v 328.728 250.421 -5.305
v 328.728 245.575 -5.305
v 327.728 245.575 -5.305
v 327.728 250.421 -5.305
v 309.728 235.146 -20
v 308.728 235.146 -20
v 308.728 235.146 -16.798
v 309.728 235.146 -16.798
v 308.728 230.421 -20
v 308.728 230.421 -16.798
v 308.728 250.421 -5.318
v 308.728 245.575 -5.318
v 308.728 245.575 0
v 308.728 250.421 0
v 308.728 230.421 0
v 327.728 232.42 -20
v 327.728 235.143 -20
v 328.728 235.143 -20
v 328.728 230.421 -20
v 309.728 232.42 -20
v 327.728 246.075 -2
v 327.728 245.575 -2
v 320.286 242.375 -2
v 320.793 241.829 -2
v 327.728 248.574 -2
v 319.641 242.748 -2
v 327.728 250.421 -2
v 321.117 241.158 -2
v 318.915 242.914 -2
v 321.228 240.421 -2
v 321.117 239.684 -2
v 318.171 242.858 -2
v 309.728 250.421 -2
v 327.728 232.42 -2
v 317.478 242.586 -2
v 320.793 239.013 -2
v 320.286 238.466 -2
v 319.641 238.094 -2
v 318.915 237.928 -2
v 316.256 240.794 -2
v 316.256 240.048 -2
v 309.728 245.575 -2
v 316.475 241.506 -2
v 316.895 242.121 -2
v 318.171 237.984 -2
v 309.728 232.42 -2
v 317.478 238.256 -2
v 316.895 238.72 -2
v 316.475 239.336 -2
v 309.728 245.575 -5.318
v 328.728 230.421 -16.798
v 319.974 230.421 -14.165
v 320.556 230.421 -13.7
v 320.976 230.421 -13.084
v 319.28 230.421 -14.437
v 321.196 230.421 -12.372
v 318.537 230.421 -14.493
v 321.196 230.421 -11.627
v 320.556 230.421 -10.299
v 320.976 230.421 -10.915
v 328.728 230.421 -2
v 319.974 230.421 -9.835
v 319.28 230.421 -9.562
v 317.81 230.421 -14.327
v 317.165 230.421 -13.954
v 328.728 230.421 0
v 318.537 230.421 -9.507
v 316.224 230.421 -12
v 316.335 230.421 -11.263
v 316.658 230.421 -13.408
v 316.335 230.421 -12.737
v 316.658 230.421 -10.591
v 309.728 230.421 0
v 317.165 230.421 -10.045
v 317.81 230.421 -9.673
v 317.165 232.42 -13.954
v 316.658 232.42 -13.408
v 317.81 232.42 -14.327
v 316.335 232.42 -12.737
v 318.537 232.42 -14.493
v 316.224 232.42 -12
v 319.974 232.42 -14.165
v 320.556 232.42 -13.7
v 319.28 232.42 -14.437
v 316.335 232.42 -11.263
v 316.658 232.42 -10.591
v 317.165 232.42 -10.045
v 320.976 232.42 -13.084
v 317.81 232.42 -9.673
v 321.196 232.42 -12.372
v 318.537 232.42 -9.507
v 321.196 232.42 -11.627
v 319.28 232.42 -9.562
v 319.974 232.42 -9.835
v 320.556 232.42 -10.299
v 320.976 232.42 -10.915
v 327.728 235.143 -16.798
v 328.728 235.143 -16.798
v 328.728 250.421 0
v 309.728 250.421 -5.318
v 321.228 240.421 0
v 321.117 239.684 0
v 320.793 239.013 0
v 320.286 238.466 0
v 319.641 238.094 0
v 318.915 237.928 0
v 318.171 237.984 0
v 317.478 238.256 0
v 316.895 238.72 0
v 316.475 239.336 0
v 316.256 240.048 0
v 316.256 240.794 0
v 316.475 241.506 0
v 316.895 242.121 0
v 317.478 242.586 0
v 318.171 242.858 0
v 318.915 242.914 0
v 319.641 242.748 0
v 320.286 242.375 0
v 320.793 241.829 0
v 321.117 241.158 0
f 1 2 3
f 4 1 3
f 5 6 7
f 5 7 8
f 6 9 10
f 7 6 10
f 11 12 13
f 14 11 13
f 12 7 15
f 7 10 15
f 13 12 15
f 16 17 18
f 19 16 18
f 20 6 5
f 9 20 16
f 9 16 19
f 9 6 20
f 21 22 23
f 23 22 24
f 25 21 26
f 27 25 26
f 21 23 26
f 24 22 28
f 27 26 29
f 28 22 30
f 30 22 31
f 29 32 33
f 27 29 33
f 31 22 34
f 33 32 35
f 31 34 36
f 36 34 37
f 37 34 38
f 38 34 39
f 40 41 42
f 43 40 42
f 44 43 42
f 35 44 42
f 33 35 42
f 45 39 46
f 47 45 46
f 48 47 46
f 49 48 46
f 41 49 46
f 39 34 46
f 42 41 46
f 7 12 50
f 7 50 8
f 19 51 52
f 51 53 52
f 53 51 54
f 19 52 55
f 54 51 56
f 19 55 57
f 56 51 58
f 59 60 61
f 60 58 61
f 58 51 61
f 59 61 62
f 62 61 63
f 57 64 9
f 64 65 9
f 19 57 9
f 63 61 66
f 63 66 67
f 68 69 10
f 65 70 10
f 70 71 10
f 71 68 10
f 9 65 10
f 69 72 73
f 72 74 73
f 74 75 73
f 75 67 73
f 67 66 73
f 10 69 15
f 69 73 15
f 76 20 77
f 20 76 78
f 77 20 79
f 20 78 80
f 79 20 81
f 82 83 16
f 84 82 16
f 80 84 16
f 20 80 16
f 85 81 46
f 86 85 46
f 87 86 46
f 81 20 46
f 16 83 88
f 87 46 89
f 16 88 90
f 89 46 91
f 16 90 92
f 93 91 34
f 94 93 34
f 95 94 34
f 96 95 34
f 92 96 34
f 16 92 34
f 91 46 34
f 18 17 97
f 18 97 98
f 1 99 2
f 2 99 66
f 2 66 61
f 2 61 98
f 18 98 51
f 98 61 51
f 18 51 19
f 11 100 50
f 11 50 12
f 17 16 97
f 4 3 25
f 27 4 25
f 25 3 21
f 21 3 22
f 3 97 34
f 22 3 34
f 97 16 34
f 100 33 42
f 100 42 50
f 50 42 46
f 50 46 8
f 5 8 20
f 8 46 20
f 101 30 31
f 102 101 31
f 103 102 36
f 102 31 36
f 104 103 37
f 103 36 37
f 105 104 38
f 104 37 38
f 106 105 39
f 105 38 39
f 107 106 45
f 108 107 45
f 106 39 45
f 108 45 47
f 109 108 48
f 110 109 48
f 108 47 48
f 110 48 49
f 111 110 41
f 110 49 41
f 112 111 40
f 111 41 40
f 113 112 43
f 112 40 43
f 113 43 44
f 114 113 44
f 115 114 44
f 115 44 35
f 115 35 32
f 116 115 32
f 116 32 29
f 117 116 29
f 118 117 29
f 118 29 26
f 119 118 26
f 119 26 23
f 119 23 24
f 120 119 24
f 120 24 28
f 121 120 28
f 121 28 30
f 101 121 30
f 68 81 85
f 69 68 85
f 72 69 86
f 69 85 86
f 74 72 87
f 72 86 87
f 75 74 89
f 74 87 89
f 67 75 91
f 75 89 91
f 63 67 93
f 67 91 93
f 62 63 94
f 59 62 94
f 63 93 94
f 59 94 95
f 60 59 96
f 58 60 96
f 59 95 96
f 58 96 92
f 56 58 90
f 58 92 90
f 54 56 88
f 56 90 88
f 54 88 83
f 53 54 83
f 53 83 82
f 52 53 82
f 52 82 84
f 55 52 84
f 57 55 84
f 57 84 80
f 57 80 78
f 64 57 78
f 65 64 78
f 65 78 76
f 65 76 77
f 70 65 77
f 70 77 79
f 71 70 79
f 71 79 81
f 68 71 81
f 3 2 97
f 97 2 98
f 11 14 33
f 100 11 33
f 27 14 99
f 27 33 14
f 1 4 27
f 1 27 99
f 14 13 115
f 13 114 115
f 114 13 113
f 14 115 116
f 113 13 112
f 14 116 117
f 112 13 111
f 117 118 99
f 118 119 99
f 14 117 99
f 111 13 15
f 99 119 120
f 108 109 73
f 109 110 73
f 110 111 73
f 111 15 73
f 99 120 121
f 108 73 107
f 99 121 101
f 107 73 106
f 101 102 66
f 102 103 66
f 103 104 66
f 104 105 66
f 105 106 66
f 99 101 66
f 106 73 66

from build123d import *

# Parameters (mm, degrees)
SKETCH_W           = 20
SKETCH_H           = 20
PAD_DEPTH          = 2
SKETCH001_W        = 21.291687
SKETCH001_H        = 2
PAD001_DEPTH       = 20
POCKET_DEPTH       = 43
PAD002_DEPTH       = 1
PAD003_DEPTH       = 1
SKETCH004_R        = 2.5
POCKET001_DEPTH    = 5
SKETCH005_R        = 2.5
POCKET002_DEPTH    = 5
POCKET003_DEPTH    = 5
POCKET003_FACE1_W  = 20
POCKET003_FACE1_H  = 2
POCKET004_DEPTH    = 1.846
POCKET005_DEPTH    = 2.202
POCKET006_DEPTH    = 5
SKETCH006_W        = 32.068451
SKETCH006_H        = 15.041733
POCKET007_DEPTH    = 5
POCKET008_DEPTH    = 2
POCKET009_DEPTH    = 2
POCKET010_DEPTH    = 0.5
POCKET011_DEPTH    = 0.5
POCKET011_FACE18_W = 2.5141439852
POCKET011_FACE18_H = 1
POCKET012_DEPTH    = 5
POCKET012_FACE12_W = 1
POCKET012_FACE12_H = 2.5
POCKET013_DEPTH    = 5
POCKET014_DEPTH    = 0.5
POCKET014_FACE5_W  = 1
POCKET014_FACE5_H  = 0.5
POCKET015_DEPTH    = 5
POCKET016_DEPTH    = 0.5
POCKET016_FACE4_W  = 0.5
POCKET016_FACE4_H  = 1
POCKET017_DEPTH    = 7.2
PAD004_DEPTH       = 3.202
PAD005_DEPTH       = 4.846


with BuildPart() as part:
    # Sketch → Pad (new body)
    with BuildSketch(Plane.XY):
        with Locations((318.7276667125, 240.4208782875)):
            Rectangle(SKETCH_W, SKETCH_H)
    extrude(amount=-PAD_DEPTH)

    # Sketch001 (on Face6 of Pad) → Pad001 (join)
    with BuildSketch(Plane(origin=(0, 0, -2), x_dir=(1, 0, 0), z_dir=(0, 0, -1))):
        with Locations((319.1250915, -231.419662)):
            Rectangle(SKETCH001_W, SKETCH001_H)
    extrude(amount=PAD001_DEPTH)

    # Pad001 Face5 → Pocket (cut)
    with BuildSketch(Plane(origin=(325.2175581813, 231.4103392408, -2), x_dir=(0, 1, 0), z_dir=(0, 0, 1))):
        Polygon((1.0093227592, 16.7383101813), (-0.9906772408, 16.7383101813), (-0.9906772408, -4.5533768187), (1.0093227592, -4.5533768187), (1.0093227592, -3.5101085312), (-0.9894609532, -3.5101085312), (-0.9894609532, 16.4898914688), (1.0093227592, 16.4898914688), align=None)
    extrude(amount=-POCKET_DEPTH, mode=Mode.SUBTRACT)

    # Sketch002 (on Face7 of Pocket) → Pad002 (join)
    with BuildSketch(Plane(origin=(308.7276667125, 0, 0), x_dir=(0, -1, 0), z_dir=(-1, 0, 0))):
        Polygon((-250.405853, 0), (-230.420715, -22), (-230.420715, 0), align=None)
    extrude(amount=-PAD002_DEPTH)

    # Sketch003 (on Face2 of Pad002) → Pad003 (join)
    with BuildSketch(Plane.YZ.offset(328.7276667125)):
        Polygon((230.420883, 0.034144), (250.420822, 0.034144), (230.420883, -22.000002), align=None)
    extrude(amount=-PAD003_DEPTH)

    # Sketch004 (on Face6 of Pad003) → Pocket001 (cut)
    with BuildSketch(Plane(origin=(0, 232.419662, 0), x_dir=(-1, 0, 0), z_dir=(0, 1, 0))):
        with Locations((-318.723811, -11.999702)):
            Circle(SKETCH004_R)
    extrude(amount=-POCKET001_DEPTH, mode=Mode.SUBTRACT)

    # Sketch005 (on Face5 of Pocket001) → Pocket002 (cut)
    with BuildSketch(Plane(origin=(0, 0, -2), x_dir=(1, 0, 0), z_dir=(0, 0, -1))):
        with Locations((318.727692, -240.420898)):
            Circle(SKETCH005_R)
    extrude(amount=-POCKET002_DEPTH, mode=Mode.SUBTRACT)

    # Pocket002 Face19 → Pocket003 (cut)
    with BuildSketch(Plane(origin=(327.7276667125, 240.4131065518, 0.0170764125), x_dir=(0, 1, 0), z_dir=(-1, 0, 0))):
        Polygon((-9.9922235518, -0.0170675875), (10.0077154482, -0.0170675875), (9.976723645, 0.0170764125), (-9.9922235518, 0.0170764125), align=None)
    extrude(amount=-POCKET003_DEPTH, mode=Mode.SUBTRACT)

    # Pocket003 Face1 → Pocket004 (cut)
    with BuildSketch(Plane(origin=(318.7276667125, 250.4208782875, -1), x_dir=(1, 0, 0), z_dir=(0, 1, 0))):
        Rectangle(POCKET003_FACE1_W, POCKET003_FACE1_H)
    extrude(amount=-POCKET004_DEPTH, mode=Mode.SUBTRACT)

    # Pocket004 Face7 → Pocket005 (cut)
    with BuildSketch(Plane(origin=(318.7276662811, 231.4202701891, -22), x_dir=(0, -1, 0), z_dir=(0, 0, -1))):
        Polygon((-0.9993918109, 9.9999995686), (-0.9993918109, -10.0000004314), (0.9993853738, -10.0000004314), (0.9993853738, -9.0000004314), (0.9993871891, -9.0000004314), (0.9993871891, -10.0000004314), (0.9993919016, -10.0000004314), (0.9993919016, 9.9999995686), align=None)
    extrude(amount=-POCKET005_DEPTH, mode=Mode.SUBTRACT)

    # Pocket005 Face11 → Pocket006 (cut)
    with BuildSketch(Plane(origin=(309.7276667125, 230.4207966437, -10.9999550626), x_dir=(0, -1, 0), z_dir=(1, 0, 0))):
        Polygon((-8.16439e-05, 10.9998651876), (-8.16439e-05, 8.7980449374), (-8.16439e-05, -10.9999550626), (8.16437e-05, -10.9999550626), (8.16437e-05, 11.0000449374), align=None)
    extrude(amount=-POCKET006_DEPTH, mode=Mode.SUBTRACT)

    # Sketch006 (on Face7 of Pocket006) → Pocket007 (cut)
    with BuildSketch(Plane(origin=(0, 0, -19.798), x_dir=(1, 0, 0), z_dir=(0, 0, -1))):
        with Locations((318.3954625, -232.1317065)):
            Rectangle(SKETCH006_W, SKETCH006_H)
    extrude(amount=POCKET007_DEPTH, mode=Mode.SUBTRACT)

    # Pocket007 Face15 → Pocket008 (cut)
    with BuildSketch(Plane(origin=(318.7273379116, 231.4203047573, -19.798), x_dir=(0, -1, 0), z_dir=(0, 0, -1))):
        Polygon((-0.9993572427, 8.9996711991), (-0.9993572427, -10.0003288009), (0.9994264698, -10.0003288009), (0.9994264698, 9.9996711991), (-1.0007408734, 9.9996711991), (-1.0007408734, 8.9996711991), align=None)
    extrude(amount=-POCKET008_DEPTH, mode=Mode.SUBTRACT)

    # Pocket008 Face3 → Pocket009 (cut)
    with BuildSketch(Plane(origin=(318.7276667125, 248.5748782875, -1), x_dir=(1, 0, 0), z_dir=(0, 1, 0))):
        Polygon((10, -1), (10, 1), (-9, 1), (-10, 1), (-10, -1), align=None)
    extrude(amount=-POCKET009_DEPTH, mode=Mode.SUBTRACT)

    # Pocket009 Face7 → Pocket010 (cut)
    with BuildSketch(Plane(origin=(318.7273379116, 231.4203047573, -17.798), x_dir=(0, -1, 0), z_dir=(0, 0, -1))):
        Polygon((-0.9993572427, 8.9996711991), (-0.9993572427, -9.0003288009), (-0.9993572427, -10.0003288009), (0.9994264698, -10.0003288009), (0.9994264698, 9.9996711991), (-1.0007408734, 9.9996711991), (-1.0007408734, 8.9996711991), align=None)
    extrude(amount=-POCKET010_DEPTH, mode=Mode.SUBTRACT)

    # Pocket010 Face3 → Pocket011 (cut)
    with BuildSketch(Plane(origin=(318.7276667125, 246.5748782875, -1), x_dir=(1, 0, 0), z_dir=(0, 1, 0))):
        Polygon((10, -1), (10, 1), (9, 1), (-9, 1), (-10, 1), (-10, -1), align=None)
    extrude(amount=-POCKET011_DEPTH, mode=Mode.SUBTRACT)

    # Pocket011 Face18 → Pocket012 (cut)
    with BuildSketch(Plane(origin=(309.2276667125, 247.3319502801, -2), x_dir=(0, 1, 0), z_dir=(0, 0, 1))):
        Rectangle(POCKET011_FACE18_W, POCKET011_FACE18_H)
    extrude(amount=-POCKET012_DEPTH, mode=Mode.SUBTRACT)

    # Pocket012 Face12 → Pocket013 (cut)
    with BuildSketch(Plane(origin=(309.2276667125, 232.4210456307, -18.548), x_dir=(-1, 0, 0), z_dir=(0, -1, 0))):
        Rectangle(POCKET012_FACE12_W, POCKET012_FACE12_H)
    extrude(amount=-POCKET013_DEPTH, mode=Mode.SUBTRACT)

    # Pocket013 Face14 → Pocket014 (cut)
    with BuildSketch(Plane(origin=(318.7269644137, 231.6380559444, -17.298), x_dir=(0, -1, 0), z_dir=(0, 0, -1))):
        Polygon((-3.0507371065, -10.0007022988), (1.2171776569, -10.0007022988), (1.2171776569, 9.9992977012), (-3.0540280954, 9.9992977012), (-3.0540280954, 8.9992977012), (-0.7816060556, 8.9992977012), (-0.7816060556, -9.0007022988), (-3.0507371065, -9.0007022988), align=None)
    extrude(amount=-POCKET014_DEPTH, mode=Mode.SUBTRACT)

    # Pocket014 Face5 → Pocket015 (cut)
    with BuildSketch(Plane(origin=(328.2276667125, 234.688793051, -17.048), x_dir=(-1, 0, 0), z_dir=(0, -1, 0))):
        Rectangle(POCKET014_FACE5_W, POCKET014_FACE5_H)
    extrude(amount=-POCKET015_DEPTH, mode=Mode.SUBTRACT)

    # Pocket015 Face3 → Pocket016 (cut)
    with BuildSketch(Plane(origin=(318.7247895723, 246.0748782875, -1.2887227346), x_dir=(1, 0, 0), z_dir=(0, 1, 0))):
        Polygon((10.0028771402, -1.2887227346), (10.0028771402, 3.4651057821), (9.0028771402, 3.4651057821), (9.0028771402, 0.7112772654), (-8.9971228598, 0.7112772654), (-8.9971228598, 3.4788922638), (-9.9971228598, 3.4788922638), (-9.9971228598, -1.2887227346), align=None)
    extrude(amount=-POCKET016_DEPTH, mode=Mode.SUBTRACT)

    # Pocket016 Face4 → Pocket017 (cut)
    with BuildSketch(Plane(origin=(328.2276667125, 245.8248782875, -4.7538285167), x_dir=(0, 1, 0), z_dir=(0, 0, 1))):
        Rectangle(POCKET016_FACE4_W, POCKET016_FACE4_H)
    extrude(amount=-POCKET017_DEPTH, mode=Mode.SUBTRACT)

    # Pocket017 Face4 → Pad004 (add)
    with BuildSketch(Plane(origin=(318.7269014881, 231.7036107724, -16.798), x_dir=(0, -1, 0), z_dir=(0, 0, -1))):
        Polygon((-3.4390219463, -10.0007652244), (1.2827324849, -10.0007652244), (1.2827324849, 9.9992347756), (-3.4426809492, 9.9992347756), (-3.4426809492, 8.9992347756), (-0.7160512276, 8.9992347756), (-0.7160512276, -9.0007652244), (-3.4390219463, -9.0007652244), align=None)
    extrude(amount=PAD004_DEPTH)

    # Pad004 Face2 → Pad005 (add)
    with BuildSketch(Plane(origin=(318.7249484764, 245.5748782875, -1.3772371444), x_dir=(1, 0, 0), z_dir=(0, 1, 0))):
        Polygon((10.002718236, -1.3772371444), (10.002718236, 3.9274467025), (9.002718236, 3.9274467025), (9.002718236, 0.6227628556), (-8.997281764, 0.6227628556), (-8.997281764, 3.940786863), (-9.997281764, 3.940786863), (-9.997281764, -1.3772371444), align=None)
    extrude(amount=PAD005_DEPTH)


solid = part.part
